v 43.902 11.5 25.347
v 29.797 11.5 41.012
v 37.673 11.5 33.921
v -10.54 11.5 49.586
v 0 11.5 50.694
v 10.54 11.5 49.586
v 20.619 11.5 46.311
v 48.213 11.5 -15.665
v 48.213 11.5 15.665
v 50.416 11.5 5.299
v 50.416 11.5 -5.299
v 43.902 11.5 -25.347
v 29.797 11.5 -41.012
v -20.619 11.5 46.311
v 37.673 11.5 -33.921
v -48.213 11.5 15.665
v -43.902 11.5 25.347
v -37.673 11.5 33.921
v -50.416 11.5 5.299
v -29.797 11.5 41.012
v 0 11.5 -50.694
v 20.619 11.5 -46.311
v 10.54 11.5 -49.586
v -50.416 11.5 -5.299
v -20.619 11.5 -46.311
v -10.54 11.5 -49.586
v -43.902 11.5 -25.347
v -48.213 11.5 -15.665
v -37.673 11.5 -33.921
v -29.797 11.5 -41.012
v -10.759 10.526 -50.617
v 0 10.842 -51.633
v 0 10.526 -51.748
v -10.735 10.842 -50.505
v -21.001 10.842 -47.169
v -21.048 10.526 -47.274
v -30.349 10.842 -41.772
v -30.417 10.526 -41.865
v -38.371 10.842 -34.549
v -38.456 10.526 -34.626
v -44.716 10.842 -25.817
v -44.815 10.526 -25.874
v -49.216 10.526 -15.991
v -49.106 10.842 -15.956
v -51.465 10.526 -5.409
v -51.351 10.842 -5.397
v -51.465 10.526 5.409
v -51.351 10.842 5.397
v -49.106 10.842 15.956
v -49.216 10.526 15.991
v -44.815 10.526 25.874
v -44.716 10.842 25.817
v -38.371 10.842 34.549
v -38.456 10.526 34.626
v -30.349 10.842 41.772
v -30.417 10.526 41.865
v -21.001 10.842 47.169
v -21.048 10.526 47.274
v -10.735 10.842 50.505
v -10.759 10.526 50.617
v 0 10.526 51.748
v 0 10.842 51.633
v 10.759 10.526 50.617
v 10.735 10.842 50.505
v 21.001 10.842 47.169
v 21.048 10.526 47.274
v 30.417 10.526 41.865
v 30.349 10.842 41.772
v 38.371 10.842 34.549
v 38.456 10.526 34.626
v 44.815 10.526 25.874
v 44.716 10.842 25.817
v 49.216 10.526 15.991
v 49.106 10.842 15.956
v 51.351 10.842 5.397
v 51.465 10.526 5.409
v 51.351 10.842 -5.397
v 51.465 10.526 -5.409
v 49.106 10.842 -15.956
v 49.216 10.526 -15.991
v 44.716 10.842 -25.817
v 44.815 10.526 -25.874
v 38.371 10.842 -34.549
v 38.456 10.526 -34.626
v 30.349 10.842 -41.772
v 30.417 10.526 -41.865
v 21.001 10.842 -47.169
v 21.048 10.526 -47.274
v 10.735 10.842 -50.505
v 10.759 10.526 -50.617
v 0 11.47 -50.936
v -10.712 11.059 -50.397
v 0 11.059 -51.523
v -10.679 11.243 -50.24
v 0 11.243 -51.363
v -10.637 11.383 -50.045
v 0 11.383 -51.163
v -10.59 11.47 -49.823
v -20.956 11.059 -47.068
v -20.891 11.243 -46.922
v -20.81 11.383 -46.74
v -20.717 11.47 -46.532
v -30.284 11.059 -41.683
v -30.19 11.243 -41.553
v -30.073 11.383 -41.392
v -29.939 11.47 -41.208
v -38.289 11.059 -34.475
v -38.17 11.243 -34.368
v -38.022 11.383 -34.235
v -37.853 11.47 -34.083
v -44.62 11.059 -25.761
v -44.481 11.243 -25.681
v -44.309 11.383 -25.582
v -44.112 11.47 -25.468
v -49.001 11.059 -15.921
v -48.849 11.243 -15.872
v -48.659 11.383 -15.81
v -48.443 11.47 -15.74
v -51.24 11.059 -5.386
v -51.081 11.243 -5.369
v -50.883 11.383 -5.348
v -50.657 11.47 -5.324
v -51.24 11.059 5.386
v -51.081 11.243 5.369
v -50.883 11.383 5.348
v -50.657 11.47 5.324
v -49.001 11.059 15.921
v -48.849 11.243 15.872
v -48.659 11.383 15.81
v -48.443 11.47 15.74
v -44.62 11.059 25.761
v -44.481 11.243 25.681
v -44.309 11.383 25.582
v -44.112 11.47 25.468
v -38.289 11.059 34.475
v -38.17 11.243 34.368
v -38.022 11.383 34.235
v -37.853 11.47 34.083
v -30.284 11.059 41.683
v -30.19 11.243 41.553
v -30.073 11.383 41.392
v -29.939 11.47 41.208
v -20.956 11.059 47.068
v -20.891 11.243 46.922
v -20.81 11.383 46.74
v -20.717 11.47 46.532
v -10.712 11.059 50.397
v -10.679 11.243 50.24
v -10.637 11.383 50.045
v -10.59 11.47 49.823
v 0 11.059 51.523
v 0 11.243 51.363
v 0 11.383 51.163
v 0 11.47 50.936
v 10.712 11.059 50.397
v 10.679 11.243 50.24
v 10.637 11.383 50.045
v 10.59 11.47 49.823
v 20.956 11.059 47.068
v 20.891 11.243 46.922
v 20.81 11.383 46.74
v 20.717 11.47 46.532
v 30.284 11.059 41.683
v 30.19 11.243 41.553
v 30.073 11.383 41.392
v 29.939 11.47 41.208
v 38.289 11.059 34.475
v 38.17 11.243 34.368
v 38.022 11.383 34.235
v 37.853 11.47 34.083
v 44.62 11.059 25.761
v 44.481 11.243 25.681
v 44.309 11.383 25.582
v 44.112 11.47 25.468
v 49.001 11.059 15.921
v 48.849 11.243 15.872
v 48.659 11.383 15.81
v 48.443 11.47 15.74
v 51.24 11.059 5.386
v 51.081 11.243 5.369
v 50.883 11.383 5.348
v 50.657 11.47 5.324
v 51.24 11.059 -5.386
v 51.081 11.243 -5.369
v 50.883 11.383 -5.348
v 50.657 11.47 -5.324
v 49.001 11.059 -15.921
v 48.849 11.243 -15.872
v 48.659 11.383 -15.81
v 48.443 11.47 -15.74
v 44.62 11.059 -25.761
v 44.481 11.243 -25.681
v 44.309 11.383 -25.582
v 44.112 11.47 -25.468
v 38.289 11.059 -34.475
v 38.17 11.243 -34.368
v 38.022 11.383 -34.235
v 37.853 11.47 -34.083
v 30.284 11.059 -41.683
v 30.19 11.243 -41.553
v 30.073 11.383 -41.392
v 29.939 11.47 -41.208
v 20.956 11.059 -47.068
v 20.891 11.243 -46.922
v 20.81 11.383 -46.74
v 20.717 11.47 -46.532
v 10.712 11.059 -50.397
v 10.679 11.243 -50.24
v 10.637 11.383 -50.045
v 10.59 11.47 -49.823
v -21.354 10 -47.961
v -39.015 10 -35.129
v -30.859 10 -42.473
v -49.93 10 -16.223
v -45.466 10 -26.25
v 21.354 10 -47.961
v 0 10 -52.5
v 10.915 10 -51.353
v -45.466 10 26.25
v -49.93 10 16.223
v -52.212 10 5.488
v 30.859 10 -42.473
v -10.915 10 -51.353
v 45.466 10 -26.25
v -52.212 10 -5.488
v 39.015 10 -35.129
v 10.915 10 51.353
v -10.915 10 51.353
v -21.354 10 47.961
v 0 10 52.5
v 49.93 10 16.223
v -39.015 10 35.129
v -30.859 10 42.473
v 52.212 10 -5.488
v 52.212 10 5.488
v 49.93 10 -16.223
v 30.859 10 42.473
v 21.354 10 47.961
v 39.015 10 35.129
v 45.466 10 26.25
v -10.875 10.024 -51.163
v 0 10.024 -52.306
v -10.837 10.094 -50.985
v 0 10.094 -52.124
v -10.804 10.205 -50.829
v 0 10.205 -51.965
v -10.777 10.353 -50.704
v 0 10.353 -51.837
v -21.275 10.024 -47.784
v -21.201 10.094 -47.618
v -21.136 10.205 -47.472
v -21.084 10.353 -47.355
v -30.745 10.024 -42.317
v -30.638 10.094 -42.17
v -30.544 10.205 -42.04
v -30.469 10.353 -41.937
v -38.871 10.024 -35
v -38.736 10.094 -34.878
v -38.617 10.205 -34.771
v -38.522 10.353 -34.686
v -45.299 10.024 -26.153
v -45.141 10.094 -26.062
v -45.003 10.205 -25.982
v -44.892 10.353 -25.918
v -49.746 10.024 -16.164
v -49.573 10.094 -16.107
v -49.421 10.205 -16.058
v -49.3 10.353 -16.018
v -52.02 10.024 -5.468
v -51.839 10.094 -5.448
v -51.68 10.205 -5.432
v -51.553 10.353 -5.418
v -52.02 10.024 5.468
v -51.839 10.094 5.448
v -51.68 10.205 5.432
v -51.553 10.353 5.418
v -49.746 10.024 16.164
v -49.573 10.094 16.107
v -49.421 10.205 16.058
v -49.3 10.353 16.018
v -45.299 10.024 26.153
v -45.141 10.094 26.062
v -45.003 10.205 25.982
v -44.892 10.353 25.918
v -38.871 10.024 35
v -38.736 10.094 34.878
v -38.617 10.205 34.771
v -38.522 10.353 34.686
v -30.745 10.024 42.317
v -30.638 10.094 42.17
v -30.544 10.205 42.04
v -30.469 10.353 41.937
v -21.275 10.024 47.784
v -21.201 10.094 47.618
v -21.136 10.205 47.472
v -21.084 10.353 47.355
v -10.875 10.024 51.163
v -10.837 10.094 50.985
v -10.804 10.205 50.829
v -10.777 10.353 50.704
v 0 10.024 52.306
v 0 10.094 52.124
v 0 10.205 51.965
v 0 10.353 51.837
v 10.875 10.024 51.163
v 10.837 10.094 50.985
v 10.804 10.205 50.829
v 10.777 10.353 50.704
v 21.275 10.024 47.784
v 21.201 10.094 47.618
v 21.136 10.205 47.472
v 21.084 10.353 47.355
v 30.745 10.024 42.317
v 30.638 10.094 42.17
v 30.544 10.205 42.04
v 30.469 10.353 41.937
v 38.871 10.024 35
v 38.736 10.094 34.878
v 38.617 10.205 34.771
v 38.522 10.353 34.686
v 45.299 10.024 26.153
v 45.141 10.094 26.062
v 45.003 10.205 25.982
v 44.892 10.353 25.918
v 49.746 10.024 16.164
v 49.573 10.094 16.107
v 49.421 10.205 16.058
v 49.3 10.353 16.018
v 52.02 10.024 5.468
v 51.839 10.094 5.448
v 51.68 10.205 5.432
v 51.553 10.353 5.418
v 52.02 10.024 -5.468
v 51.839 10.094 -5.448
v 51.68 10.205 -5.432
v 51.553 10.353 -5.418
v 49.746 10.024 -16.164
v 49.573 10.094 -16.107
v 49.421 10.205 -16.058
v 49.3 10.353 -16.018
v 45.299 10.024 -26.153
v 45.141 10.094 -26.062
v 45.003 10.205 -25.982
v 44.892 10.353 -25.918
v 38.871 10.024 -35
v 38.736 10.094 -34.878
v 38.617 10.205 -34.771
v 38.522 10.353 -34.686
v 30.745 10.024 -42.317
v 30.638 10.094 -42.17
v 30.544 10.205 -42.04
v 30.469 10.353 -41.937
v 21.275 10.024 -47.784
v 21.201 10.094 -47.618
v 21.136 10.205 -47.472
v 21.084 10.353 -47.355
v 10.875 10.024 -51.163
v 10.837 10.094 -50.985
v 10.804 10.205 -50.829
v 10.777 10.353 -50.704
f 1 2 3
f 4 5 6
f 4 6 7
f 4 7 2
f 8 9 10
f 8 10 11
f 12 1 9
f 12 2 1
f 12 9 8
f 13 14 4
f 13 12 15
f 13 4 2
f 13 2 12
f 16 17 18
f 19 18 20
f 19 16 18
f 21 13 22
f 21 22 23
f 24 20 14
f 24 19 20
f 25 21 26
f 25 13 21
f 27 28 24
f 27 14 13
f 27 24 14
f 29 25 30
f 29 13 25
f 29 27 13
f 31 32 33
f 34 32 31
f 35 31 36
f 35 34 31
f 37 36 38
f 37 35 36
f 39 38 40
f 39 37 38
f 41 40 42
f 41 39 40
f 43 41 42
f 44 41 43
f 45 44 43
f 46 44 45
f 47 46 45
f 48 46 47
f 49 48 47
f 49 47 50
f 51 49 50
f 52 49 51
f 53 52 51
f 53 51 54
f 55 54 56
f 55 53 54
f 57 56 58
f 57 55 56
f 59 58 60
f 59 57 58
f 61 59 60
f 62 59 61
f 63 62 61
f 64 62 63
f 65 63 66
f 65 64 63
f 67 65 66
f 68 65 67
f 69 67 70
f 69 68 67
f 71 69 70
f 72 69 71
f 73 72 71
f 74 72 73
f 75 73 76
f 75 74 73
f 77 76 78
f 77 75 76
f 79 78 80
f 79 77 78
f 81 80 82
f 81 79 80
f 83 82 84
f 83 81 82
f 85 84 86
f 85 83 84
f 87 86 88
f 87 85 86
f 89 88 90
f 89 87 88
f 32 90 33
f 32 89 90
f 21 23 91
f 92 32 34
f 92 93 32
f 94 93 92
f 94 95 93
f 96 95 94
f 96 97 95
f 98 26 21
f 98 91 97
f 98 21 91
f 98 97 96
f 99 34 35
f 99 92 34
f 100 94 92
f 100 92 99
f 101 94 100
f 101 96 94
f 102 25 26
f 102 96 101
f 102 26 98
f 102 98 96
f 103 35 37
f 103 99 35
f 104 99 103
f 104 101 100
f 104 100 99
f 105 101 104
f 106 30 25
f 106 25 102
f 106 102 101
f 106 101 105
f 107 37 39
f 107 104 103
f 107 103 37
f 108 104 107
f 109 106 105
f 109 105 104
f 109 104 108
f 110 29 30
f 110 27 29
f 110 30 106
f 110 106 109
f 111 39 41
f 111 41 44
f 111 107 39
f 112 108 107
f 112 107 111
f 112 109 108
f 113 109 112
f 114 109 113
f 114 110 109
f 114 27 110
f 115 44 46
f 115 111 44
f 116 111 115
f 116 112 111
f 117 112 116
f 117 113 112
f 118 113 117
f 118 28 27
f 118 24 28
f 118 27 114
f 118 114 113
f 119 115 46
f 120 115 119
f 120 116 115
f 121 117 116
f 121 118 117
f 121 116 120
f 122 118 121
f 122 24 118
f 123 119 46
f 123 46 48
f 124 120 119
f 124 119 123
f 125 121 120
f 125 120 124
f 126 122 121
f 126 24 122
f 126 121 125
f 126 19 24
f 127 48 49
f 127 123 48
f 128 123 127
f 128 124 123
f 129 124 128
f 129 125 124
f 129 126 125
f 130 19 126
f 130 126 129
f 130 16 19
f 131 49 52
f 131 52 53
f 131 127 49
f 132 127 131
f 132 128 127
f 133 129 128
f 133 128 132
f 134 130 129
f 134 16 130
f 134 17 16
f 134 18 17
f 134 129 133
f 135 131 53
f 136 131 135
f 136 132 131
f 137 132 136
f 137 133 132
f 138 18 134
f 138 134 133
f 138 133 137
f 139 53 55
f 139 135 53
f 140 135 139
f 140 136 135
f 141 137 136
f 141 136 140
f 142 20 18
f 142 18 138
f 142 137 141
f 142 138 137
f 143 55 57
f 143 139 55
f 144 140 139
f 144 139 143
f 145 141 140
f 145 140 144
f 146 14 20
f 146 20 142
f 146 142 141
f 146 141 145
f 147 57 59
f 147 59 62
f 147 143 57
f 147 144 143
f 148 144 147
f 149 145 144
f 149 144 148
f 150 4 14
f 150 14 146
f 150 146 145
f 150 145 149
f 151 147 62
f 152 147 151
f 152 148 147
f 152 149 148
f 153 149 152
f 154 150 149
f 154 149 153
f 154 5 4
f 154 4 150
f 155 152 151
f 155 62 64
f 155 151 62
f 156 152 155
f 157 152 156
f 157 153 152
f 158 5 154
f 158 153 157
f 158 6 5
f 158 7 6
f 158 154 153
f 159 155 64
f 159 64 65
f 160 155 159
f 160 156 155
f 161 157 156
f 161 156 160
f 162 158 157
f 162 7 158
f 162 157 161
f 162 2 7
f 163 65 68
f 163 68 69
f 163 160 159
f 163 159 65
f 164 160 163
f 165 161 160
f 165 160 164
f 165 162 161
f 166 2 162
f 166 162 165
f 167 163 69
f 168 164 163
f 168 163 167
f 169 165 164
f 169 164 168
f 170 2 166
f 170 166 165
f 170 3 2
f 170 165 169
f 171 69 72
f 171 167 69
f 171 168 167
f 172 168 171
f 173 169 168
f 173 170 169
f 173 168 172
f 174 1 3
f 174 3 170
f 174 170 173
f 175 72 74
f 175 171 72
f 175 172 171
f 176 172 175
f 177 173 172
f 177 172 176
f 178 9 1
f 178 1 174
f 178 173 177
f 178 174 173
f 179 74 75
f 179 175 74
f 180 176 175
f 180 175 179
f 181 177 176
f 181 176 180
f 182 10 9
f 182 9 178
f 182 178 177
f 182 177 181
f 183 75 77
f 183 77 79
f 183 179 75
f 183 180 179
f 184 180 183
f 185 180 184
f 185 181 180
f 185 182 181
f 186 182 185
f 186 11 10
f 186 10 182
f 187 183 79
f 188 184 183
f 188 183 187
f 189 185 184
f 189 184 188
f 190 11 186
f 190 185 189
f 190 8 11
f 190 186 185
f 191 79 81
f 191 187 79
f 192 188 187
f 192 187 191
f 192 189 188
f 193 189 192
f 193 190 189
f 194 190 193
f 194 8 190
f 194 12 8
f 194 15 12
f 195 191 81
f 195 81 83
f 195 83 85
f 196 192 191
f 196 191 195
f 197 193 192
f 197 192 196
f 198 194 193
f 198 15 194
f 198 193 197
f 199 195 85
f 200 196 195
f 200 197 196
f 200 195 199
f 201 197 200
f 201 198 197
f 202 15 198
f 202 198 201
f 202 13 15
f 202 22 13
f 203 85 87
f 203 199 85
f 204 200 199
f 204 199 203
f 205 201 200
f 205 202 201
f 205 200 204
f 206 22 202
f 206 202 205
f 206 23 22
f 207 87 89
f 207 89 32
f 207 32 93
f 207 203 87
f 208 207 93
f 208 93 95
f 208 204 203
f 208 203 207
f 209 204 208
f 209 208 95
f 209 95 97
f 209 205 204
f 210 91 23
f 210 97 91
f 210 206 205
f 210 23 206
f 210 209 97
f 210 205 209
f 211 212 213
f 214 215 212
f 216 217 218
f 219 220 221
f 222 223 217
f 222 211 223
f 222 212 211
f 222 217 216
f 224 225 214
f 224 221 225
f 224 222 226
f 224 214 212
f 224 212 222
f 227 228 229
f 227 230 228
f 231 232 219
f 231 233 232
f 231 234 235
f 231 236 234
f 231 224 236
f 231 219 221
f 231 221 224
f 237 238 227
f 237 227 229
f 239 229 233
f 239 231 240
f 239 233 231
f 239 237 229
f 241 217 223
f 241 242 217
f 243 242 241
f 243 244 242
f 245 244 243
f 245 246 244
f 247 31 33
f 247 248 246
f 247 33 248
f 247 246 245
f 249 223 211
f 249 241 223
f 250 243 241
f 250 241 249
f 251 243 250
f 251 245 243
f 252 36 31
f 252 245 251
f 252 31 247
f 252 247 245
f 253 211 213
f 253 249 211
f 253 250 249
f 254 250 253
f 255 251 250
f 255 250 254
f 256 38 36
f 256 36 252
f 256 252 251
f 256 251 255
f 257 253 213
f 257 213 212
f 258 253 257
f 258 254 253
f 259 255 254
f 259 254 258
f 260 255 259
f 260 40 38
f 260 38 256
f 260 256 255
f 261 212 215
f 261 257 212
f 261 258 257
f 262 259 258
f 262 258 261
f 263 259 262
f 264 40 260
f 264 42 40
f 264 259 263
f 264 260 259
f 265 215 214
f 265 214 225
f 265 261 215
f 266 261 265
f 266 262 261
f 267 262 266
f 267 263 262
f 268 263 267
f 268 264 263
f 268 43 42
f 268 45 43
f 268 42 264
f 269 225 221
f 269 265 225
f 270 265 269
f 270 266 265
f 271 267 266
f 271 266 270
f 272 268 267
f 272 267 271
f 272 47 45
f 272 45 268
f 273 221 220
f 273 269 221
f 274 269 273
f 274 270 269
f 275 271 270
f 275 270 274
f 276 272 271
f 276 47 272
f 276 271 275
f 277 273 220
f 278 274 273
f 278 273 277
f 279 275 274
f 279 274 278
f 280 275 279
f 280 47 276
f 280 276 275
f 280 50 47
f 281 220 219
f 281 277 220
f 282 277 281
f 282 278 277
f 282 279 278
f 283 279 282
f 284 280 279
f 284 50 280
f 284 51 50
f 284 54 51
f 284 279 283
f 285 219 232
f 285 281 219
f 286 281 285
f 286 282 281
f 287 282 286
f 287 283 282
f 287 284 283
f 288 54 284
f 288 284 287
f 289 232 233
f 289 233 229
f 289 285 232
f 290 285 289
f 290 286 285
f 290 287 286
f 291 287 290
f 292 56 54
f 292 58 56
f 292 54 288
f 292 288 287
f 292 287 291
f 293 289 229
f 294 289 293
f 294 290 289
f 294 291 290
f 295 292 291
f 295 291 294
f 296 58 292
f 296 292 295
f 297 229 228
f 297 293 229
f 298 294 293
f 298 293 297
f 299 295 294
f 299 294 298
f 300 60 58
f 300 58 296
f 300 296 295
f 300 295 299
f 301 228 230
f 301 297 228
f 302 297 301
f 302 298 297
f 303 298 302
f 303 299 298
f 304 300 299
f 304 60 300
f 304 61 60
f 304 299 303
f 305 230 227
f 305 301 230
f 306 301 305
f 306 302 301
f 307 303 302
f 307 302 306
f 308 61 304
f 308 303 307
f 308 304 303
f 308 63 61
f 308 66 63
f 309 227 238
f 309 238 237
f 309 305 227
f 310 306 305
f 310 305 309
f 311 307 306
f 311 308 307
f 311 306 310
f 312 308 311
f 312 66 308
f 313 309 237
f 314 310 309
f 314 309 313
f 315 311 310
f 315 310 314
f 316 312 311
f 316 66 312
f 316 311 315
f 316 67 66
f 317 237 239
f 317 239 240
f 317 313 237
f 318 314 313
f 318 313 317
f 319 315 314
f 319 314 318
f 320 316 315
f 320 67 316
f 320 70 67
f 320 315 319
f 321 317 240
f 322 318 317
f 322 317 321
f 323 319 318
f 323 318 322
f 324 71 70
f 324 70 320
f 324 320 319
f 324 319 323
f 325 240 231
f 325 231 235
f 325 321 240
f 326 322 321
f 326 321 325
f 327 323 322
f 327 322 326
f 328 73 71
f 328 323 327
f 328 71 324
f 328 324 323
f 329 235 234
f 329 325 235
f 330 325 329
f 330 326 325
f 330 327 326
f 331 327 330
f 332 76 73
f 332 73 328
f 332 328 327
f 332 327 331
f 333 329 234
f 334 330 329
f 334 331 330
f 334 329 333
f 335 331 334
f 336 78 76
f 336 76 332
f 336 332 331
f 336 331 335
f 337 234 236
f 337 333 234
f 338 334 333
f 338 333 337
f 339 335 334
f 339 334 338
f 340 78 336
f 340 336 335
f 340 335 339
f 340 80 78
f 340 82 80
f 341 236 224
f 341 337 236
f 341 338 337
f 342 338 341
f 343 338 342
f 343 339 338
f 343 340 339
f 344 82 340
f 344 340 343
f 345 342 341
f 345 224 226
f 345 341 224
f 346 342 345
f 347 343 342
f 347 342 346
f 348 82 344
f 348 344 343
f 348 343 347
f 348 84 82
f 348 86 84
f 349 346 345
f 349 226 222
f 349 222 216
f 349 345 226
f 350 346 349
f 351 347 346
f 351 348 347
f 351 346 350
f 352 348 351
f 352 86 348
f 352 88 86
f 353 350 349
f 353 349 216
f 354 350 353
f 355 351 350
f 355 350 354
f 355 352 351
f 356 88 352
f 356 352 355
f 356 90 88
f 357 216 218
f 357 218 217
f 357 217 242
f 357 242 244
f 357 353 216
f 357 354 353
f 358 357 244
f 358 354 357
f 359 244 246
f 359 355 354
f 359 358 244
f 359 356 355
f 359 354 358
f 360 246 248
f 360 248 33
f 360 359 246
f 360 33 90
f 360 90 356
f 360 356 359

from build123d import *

# Parameters (mm, degrees)
SKIZZE1_R                       = 75
AUFSATZ_LINEAR_AUSTRAGEN1_DEPTH = 10
SKIZZE8_R                       = 75
SCHNITT_LINEAR_AUSTRAGEN1_DEPTH = 10


with BuildPart() as part:
    # Skizze1 → Aufsatz-Linear austragen1 (new body)
    with BuildSketch(Plane(origin=(0, 0, 0), x_dir=(1, 0, 0), z_dir=(0, 1, 0))):
        with Locations(Location((0, 0, 0), (0, 0, 270))):  # turned: the seam where the file's is
            Circle(SKIZZE1_R)
    extrude(amount=AUFSATZ_LINEAR_AUSTRAGEN1_DEPTH)

    # Skizze7 → Rotation1 (revolve)
    with BuildSketch(Plane.XY, mode=Mode.PRIVATE) as rotation1_sk:
        with BuildLine():
            Line((-51.748245903, 10.526383885), (-51.633363701, 10.842020143))
            ThreePointArc((-51.633363701, 10.842020143), (-51.267247516, 11.319152044), (-50.69367108, 11.5))
            Line((-50.69367108, 11.5), (0, 11.5))
            Line((0, 11.5), (0, 10))
            Line((0, 10), (-52.5, 10))
            ThreePointArc((-52.5, 10), (-52.041138851, 10.144678365), (-51.748245903, 10.526383885))
        make_face()
    revolve(rotation1_sk.sketch.rotate(Axis((0, 0, 0), (0, 1, 0)), 270), axis=Axis((0, 0, 0), (0, 1, 0)))  # turned: the seam where the file's is

    # Skizze8 → Schnitt-Linear austragen1 (cut)
    with BuildSketch(Plane.XZ):
        Circle(SKIZZE8_R)
    extrude(amount=-SCHNITT_LINEAR_AUSTRAGEN1_DEPTH, mode=Mode.SUBTRACT)


solid = part.part
